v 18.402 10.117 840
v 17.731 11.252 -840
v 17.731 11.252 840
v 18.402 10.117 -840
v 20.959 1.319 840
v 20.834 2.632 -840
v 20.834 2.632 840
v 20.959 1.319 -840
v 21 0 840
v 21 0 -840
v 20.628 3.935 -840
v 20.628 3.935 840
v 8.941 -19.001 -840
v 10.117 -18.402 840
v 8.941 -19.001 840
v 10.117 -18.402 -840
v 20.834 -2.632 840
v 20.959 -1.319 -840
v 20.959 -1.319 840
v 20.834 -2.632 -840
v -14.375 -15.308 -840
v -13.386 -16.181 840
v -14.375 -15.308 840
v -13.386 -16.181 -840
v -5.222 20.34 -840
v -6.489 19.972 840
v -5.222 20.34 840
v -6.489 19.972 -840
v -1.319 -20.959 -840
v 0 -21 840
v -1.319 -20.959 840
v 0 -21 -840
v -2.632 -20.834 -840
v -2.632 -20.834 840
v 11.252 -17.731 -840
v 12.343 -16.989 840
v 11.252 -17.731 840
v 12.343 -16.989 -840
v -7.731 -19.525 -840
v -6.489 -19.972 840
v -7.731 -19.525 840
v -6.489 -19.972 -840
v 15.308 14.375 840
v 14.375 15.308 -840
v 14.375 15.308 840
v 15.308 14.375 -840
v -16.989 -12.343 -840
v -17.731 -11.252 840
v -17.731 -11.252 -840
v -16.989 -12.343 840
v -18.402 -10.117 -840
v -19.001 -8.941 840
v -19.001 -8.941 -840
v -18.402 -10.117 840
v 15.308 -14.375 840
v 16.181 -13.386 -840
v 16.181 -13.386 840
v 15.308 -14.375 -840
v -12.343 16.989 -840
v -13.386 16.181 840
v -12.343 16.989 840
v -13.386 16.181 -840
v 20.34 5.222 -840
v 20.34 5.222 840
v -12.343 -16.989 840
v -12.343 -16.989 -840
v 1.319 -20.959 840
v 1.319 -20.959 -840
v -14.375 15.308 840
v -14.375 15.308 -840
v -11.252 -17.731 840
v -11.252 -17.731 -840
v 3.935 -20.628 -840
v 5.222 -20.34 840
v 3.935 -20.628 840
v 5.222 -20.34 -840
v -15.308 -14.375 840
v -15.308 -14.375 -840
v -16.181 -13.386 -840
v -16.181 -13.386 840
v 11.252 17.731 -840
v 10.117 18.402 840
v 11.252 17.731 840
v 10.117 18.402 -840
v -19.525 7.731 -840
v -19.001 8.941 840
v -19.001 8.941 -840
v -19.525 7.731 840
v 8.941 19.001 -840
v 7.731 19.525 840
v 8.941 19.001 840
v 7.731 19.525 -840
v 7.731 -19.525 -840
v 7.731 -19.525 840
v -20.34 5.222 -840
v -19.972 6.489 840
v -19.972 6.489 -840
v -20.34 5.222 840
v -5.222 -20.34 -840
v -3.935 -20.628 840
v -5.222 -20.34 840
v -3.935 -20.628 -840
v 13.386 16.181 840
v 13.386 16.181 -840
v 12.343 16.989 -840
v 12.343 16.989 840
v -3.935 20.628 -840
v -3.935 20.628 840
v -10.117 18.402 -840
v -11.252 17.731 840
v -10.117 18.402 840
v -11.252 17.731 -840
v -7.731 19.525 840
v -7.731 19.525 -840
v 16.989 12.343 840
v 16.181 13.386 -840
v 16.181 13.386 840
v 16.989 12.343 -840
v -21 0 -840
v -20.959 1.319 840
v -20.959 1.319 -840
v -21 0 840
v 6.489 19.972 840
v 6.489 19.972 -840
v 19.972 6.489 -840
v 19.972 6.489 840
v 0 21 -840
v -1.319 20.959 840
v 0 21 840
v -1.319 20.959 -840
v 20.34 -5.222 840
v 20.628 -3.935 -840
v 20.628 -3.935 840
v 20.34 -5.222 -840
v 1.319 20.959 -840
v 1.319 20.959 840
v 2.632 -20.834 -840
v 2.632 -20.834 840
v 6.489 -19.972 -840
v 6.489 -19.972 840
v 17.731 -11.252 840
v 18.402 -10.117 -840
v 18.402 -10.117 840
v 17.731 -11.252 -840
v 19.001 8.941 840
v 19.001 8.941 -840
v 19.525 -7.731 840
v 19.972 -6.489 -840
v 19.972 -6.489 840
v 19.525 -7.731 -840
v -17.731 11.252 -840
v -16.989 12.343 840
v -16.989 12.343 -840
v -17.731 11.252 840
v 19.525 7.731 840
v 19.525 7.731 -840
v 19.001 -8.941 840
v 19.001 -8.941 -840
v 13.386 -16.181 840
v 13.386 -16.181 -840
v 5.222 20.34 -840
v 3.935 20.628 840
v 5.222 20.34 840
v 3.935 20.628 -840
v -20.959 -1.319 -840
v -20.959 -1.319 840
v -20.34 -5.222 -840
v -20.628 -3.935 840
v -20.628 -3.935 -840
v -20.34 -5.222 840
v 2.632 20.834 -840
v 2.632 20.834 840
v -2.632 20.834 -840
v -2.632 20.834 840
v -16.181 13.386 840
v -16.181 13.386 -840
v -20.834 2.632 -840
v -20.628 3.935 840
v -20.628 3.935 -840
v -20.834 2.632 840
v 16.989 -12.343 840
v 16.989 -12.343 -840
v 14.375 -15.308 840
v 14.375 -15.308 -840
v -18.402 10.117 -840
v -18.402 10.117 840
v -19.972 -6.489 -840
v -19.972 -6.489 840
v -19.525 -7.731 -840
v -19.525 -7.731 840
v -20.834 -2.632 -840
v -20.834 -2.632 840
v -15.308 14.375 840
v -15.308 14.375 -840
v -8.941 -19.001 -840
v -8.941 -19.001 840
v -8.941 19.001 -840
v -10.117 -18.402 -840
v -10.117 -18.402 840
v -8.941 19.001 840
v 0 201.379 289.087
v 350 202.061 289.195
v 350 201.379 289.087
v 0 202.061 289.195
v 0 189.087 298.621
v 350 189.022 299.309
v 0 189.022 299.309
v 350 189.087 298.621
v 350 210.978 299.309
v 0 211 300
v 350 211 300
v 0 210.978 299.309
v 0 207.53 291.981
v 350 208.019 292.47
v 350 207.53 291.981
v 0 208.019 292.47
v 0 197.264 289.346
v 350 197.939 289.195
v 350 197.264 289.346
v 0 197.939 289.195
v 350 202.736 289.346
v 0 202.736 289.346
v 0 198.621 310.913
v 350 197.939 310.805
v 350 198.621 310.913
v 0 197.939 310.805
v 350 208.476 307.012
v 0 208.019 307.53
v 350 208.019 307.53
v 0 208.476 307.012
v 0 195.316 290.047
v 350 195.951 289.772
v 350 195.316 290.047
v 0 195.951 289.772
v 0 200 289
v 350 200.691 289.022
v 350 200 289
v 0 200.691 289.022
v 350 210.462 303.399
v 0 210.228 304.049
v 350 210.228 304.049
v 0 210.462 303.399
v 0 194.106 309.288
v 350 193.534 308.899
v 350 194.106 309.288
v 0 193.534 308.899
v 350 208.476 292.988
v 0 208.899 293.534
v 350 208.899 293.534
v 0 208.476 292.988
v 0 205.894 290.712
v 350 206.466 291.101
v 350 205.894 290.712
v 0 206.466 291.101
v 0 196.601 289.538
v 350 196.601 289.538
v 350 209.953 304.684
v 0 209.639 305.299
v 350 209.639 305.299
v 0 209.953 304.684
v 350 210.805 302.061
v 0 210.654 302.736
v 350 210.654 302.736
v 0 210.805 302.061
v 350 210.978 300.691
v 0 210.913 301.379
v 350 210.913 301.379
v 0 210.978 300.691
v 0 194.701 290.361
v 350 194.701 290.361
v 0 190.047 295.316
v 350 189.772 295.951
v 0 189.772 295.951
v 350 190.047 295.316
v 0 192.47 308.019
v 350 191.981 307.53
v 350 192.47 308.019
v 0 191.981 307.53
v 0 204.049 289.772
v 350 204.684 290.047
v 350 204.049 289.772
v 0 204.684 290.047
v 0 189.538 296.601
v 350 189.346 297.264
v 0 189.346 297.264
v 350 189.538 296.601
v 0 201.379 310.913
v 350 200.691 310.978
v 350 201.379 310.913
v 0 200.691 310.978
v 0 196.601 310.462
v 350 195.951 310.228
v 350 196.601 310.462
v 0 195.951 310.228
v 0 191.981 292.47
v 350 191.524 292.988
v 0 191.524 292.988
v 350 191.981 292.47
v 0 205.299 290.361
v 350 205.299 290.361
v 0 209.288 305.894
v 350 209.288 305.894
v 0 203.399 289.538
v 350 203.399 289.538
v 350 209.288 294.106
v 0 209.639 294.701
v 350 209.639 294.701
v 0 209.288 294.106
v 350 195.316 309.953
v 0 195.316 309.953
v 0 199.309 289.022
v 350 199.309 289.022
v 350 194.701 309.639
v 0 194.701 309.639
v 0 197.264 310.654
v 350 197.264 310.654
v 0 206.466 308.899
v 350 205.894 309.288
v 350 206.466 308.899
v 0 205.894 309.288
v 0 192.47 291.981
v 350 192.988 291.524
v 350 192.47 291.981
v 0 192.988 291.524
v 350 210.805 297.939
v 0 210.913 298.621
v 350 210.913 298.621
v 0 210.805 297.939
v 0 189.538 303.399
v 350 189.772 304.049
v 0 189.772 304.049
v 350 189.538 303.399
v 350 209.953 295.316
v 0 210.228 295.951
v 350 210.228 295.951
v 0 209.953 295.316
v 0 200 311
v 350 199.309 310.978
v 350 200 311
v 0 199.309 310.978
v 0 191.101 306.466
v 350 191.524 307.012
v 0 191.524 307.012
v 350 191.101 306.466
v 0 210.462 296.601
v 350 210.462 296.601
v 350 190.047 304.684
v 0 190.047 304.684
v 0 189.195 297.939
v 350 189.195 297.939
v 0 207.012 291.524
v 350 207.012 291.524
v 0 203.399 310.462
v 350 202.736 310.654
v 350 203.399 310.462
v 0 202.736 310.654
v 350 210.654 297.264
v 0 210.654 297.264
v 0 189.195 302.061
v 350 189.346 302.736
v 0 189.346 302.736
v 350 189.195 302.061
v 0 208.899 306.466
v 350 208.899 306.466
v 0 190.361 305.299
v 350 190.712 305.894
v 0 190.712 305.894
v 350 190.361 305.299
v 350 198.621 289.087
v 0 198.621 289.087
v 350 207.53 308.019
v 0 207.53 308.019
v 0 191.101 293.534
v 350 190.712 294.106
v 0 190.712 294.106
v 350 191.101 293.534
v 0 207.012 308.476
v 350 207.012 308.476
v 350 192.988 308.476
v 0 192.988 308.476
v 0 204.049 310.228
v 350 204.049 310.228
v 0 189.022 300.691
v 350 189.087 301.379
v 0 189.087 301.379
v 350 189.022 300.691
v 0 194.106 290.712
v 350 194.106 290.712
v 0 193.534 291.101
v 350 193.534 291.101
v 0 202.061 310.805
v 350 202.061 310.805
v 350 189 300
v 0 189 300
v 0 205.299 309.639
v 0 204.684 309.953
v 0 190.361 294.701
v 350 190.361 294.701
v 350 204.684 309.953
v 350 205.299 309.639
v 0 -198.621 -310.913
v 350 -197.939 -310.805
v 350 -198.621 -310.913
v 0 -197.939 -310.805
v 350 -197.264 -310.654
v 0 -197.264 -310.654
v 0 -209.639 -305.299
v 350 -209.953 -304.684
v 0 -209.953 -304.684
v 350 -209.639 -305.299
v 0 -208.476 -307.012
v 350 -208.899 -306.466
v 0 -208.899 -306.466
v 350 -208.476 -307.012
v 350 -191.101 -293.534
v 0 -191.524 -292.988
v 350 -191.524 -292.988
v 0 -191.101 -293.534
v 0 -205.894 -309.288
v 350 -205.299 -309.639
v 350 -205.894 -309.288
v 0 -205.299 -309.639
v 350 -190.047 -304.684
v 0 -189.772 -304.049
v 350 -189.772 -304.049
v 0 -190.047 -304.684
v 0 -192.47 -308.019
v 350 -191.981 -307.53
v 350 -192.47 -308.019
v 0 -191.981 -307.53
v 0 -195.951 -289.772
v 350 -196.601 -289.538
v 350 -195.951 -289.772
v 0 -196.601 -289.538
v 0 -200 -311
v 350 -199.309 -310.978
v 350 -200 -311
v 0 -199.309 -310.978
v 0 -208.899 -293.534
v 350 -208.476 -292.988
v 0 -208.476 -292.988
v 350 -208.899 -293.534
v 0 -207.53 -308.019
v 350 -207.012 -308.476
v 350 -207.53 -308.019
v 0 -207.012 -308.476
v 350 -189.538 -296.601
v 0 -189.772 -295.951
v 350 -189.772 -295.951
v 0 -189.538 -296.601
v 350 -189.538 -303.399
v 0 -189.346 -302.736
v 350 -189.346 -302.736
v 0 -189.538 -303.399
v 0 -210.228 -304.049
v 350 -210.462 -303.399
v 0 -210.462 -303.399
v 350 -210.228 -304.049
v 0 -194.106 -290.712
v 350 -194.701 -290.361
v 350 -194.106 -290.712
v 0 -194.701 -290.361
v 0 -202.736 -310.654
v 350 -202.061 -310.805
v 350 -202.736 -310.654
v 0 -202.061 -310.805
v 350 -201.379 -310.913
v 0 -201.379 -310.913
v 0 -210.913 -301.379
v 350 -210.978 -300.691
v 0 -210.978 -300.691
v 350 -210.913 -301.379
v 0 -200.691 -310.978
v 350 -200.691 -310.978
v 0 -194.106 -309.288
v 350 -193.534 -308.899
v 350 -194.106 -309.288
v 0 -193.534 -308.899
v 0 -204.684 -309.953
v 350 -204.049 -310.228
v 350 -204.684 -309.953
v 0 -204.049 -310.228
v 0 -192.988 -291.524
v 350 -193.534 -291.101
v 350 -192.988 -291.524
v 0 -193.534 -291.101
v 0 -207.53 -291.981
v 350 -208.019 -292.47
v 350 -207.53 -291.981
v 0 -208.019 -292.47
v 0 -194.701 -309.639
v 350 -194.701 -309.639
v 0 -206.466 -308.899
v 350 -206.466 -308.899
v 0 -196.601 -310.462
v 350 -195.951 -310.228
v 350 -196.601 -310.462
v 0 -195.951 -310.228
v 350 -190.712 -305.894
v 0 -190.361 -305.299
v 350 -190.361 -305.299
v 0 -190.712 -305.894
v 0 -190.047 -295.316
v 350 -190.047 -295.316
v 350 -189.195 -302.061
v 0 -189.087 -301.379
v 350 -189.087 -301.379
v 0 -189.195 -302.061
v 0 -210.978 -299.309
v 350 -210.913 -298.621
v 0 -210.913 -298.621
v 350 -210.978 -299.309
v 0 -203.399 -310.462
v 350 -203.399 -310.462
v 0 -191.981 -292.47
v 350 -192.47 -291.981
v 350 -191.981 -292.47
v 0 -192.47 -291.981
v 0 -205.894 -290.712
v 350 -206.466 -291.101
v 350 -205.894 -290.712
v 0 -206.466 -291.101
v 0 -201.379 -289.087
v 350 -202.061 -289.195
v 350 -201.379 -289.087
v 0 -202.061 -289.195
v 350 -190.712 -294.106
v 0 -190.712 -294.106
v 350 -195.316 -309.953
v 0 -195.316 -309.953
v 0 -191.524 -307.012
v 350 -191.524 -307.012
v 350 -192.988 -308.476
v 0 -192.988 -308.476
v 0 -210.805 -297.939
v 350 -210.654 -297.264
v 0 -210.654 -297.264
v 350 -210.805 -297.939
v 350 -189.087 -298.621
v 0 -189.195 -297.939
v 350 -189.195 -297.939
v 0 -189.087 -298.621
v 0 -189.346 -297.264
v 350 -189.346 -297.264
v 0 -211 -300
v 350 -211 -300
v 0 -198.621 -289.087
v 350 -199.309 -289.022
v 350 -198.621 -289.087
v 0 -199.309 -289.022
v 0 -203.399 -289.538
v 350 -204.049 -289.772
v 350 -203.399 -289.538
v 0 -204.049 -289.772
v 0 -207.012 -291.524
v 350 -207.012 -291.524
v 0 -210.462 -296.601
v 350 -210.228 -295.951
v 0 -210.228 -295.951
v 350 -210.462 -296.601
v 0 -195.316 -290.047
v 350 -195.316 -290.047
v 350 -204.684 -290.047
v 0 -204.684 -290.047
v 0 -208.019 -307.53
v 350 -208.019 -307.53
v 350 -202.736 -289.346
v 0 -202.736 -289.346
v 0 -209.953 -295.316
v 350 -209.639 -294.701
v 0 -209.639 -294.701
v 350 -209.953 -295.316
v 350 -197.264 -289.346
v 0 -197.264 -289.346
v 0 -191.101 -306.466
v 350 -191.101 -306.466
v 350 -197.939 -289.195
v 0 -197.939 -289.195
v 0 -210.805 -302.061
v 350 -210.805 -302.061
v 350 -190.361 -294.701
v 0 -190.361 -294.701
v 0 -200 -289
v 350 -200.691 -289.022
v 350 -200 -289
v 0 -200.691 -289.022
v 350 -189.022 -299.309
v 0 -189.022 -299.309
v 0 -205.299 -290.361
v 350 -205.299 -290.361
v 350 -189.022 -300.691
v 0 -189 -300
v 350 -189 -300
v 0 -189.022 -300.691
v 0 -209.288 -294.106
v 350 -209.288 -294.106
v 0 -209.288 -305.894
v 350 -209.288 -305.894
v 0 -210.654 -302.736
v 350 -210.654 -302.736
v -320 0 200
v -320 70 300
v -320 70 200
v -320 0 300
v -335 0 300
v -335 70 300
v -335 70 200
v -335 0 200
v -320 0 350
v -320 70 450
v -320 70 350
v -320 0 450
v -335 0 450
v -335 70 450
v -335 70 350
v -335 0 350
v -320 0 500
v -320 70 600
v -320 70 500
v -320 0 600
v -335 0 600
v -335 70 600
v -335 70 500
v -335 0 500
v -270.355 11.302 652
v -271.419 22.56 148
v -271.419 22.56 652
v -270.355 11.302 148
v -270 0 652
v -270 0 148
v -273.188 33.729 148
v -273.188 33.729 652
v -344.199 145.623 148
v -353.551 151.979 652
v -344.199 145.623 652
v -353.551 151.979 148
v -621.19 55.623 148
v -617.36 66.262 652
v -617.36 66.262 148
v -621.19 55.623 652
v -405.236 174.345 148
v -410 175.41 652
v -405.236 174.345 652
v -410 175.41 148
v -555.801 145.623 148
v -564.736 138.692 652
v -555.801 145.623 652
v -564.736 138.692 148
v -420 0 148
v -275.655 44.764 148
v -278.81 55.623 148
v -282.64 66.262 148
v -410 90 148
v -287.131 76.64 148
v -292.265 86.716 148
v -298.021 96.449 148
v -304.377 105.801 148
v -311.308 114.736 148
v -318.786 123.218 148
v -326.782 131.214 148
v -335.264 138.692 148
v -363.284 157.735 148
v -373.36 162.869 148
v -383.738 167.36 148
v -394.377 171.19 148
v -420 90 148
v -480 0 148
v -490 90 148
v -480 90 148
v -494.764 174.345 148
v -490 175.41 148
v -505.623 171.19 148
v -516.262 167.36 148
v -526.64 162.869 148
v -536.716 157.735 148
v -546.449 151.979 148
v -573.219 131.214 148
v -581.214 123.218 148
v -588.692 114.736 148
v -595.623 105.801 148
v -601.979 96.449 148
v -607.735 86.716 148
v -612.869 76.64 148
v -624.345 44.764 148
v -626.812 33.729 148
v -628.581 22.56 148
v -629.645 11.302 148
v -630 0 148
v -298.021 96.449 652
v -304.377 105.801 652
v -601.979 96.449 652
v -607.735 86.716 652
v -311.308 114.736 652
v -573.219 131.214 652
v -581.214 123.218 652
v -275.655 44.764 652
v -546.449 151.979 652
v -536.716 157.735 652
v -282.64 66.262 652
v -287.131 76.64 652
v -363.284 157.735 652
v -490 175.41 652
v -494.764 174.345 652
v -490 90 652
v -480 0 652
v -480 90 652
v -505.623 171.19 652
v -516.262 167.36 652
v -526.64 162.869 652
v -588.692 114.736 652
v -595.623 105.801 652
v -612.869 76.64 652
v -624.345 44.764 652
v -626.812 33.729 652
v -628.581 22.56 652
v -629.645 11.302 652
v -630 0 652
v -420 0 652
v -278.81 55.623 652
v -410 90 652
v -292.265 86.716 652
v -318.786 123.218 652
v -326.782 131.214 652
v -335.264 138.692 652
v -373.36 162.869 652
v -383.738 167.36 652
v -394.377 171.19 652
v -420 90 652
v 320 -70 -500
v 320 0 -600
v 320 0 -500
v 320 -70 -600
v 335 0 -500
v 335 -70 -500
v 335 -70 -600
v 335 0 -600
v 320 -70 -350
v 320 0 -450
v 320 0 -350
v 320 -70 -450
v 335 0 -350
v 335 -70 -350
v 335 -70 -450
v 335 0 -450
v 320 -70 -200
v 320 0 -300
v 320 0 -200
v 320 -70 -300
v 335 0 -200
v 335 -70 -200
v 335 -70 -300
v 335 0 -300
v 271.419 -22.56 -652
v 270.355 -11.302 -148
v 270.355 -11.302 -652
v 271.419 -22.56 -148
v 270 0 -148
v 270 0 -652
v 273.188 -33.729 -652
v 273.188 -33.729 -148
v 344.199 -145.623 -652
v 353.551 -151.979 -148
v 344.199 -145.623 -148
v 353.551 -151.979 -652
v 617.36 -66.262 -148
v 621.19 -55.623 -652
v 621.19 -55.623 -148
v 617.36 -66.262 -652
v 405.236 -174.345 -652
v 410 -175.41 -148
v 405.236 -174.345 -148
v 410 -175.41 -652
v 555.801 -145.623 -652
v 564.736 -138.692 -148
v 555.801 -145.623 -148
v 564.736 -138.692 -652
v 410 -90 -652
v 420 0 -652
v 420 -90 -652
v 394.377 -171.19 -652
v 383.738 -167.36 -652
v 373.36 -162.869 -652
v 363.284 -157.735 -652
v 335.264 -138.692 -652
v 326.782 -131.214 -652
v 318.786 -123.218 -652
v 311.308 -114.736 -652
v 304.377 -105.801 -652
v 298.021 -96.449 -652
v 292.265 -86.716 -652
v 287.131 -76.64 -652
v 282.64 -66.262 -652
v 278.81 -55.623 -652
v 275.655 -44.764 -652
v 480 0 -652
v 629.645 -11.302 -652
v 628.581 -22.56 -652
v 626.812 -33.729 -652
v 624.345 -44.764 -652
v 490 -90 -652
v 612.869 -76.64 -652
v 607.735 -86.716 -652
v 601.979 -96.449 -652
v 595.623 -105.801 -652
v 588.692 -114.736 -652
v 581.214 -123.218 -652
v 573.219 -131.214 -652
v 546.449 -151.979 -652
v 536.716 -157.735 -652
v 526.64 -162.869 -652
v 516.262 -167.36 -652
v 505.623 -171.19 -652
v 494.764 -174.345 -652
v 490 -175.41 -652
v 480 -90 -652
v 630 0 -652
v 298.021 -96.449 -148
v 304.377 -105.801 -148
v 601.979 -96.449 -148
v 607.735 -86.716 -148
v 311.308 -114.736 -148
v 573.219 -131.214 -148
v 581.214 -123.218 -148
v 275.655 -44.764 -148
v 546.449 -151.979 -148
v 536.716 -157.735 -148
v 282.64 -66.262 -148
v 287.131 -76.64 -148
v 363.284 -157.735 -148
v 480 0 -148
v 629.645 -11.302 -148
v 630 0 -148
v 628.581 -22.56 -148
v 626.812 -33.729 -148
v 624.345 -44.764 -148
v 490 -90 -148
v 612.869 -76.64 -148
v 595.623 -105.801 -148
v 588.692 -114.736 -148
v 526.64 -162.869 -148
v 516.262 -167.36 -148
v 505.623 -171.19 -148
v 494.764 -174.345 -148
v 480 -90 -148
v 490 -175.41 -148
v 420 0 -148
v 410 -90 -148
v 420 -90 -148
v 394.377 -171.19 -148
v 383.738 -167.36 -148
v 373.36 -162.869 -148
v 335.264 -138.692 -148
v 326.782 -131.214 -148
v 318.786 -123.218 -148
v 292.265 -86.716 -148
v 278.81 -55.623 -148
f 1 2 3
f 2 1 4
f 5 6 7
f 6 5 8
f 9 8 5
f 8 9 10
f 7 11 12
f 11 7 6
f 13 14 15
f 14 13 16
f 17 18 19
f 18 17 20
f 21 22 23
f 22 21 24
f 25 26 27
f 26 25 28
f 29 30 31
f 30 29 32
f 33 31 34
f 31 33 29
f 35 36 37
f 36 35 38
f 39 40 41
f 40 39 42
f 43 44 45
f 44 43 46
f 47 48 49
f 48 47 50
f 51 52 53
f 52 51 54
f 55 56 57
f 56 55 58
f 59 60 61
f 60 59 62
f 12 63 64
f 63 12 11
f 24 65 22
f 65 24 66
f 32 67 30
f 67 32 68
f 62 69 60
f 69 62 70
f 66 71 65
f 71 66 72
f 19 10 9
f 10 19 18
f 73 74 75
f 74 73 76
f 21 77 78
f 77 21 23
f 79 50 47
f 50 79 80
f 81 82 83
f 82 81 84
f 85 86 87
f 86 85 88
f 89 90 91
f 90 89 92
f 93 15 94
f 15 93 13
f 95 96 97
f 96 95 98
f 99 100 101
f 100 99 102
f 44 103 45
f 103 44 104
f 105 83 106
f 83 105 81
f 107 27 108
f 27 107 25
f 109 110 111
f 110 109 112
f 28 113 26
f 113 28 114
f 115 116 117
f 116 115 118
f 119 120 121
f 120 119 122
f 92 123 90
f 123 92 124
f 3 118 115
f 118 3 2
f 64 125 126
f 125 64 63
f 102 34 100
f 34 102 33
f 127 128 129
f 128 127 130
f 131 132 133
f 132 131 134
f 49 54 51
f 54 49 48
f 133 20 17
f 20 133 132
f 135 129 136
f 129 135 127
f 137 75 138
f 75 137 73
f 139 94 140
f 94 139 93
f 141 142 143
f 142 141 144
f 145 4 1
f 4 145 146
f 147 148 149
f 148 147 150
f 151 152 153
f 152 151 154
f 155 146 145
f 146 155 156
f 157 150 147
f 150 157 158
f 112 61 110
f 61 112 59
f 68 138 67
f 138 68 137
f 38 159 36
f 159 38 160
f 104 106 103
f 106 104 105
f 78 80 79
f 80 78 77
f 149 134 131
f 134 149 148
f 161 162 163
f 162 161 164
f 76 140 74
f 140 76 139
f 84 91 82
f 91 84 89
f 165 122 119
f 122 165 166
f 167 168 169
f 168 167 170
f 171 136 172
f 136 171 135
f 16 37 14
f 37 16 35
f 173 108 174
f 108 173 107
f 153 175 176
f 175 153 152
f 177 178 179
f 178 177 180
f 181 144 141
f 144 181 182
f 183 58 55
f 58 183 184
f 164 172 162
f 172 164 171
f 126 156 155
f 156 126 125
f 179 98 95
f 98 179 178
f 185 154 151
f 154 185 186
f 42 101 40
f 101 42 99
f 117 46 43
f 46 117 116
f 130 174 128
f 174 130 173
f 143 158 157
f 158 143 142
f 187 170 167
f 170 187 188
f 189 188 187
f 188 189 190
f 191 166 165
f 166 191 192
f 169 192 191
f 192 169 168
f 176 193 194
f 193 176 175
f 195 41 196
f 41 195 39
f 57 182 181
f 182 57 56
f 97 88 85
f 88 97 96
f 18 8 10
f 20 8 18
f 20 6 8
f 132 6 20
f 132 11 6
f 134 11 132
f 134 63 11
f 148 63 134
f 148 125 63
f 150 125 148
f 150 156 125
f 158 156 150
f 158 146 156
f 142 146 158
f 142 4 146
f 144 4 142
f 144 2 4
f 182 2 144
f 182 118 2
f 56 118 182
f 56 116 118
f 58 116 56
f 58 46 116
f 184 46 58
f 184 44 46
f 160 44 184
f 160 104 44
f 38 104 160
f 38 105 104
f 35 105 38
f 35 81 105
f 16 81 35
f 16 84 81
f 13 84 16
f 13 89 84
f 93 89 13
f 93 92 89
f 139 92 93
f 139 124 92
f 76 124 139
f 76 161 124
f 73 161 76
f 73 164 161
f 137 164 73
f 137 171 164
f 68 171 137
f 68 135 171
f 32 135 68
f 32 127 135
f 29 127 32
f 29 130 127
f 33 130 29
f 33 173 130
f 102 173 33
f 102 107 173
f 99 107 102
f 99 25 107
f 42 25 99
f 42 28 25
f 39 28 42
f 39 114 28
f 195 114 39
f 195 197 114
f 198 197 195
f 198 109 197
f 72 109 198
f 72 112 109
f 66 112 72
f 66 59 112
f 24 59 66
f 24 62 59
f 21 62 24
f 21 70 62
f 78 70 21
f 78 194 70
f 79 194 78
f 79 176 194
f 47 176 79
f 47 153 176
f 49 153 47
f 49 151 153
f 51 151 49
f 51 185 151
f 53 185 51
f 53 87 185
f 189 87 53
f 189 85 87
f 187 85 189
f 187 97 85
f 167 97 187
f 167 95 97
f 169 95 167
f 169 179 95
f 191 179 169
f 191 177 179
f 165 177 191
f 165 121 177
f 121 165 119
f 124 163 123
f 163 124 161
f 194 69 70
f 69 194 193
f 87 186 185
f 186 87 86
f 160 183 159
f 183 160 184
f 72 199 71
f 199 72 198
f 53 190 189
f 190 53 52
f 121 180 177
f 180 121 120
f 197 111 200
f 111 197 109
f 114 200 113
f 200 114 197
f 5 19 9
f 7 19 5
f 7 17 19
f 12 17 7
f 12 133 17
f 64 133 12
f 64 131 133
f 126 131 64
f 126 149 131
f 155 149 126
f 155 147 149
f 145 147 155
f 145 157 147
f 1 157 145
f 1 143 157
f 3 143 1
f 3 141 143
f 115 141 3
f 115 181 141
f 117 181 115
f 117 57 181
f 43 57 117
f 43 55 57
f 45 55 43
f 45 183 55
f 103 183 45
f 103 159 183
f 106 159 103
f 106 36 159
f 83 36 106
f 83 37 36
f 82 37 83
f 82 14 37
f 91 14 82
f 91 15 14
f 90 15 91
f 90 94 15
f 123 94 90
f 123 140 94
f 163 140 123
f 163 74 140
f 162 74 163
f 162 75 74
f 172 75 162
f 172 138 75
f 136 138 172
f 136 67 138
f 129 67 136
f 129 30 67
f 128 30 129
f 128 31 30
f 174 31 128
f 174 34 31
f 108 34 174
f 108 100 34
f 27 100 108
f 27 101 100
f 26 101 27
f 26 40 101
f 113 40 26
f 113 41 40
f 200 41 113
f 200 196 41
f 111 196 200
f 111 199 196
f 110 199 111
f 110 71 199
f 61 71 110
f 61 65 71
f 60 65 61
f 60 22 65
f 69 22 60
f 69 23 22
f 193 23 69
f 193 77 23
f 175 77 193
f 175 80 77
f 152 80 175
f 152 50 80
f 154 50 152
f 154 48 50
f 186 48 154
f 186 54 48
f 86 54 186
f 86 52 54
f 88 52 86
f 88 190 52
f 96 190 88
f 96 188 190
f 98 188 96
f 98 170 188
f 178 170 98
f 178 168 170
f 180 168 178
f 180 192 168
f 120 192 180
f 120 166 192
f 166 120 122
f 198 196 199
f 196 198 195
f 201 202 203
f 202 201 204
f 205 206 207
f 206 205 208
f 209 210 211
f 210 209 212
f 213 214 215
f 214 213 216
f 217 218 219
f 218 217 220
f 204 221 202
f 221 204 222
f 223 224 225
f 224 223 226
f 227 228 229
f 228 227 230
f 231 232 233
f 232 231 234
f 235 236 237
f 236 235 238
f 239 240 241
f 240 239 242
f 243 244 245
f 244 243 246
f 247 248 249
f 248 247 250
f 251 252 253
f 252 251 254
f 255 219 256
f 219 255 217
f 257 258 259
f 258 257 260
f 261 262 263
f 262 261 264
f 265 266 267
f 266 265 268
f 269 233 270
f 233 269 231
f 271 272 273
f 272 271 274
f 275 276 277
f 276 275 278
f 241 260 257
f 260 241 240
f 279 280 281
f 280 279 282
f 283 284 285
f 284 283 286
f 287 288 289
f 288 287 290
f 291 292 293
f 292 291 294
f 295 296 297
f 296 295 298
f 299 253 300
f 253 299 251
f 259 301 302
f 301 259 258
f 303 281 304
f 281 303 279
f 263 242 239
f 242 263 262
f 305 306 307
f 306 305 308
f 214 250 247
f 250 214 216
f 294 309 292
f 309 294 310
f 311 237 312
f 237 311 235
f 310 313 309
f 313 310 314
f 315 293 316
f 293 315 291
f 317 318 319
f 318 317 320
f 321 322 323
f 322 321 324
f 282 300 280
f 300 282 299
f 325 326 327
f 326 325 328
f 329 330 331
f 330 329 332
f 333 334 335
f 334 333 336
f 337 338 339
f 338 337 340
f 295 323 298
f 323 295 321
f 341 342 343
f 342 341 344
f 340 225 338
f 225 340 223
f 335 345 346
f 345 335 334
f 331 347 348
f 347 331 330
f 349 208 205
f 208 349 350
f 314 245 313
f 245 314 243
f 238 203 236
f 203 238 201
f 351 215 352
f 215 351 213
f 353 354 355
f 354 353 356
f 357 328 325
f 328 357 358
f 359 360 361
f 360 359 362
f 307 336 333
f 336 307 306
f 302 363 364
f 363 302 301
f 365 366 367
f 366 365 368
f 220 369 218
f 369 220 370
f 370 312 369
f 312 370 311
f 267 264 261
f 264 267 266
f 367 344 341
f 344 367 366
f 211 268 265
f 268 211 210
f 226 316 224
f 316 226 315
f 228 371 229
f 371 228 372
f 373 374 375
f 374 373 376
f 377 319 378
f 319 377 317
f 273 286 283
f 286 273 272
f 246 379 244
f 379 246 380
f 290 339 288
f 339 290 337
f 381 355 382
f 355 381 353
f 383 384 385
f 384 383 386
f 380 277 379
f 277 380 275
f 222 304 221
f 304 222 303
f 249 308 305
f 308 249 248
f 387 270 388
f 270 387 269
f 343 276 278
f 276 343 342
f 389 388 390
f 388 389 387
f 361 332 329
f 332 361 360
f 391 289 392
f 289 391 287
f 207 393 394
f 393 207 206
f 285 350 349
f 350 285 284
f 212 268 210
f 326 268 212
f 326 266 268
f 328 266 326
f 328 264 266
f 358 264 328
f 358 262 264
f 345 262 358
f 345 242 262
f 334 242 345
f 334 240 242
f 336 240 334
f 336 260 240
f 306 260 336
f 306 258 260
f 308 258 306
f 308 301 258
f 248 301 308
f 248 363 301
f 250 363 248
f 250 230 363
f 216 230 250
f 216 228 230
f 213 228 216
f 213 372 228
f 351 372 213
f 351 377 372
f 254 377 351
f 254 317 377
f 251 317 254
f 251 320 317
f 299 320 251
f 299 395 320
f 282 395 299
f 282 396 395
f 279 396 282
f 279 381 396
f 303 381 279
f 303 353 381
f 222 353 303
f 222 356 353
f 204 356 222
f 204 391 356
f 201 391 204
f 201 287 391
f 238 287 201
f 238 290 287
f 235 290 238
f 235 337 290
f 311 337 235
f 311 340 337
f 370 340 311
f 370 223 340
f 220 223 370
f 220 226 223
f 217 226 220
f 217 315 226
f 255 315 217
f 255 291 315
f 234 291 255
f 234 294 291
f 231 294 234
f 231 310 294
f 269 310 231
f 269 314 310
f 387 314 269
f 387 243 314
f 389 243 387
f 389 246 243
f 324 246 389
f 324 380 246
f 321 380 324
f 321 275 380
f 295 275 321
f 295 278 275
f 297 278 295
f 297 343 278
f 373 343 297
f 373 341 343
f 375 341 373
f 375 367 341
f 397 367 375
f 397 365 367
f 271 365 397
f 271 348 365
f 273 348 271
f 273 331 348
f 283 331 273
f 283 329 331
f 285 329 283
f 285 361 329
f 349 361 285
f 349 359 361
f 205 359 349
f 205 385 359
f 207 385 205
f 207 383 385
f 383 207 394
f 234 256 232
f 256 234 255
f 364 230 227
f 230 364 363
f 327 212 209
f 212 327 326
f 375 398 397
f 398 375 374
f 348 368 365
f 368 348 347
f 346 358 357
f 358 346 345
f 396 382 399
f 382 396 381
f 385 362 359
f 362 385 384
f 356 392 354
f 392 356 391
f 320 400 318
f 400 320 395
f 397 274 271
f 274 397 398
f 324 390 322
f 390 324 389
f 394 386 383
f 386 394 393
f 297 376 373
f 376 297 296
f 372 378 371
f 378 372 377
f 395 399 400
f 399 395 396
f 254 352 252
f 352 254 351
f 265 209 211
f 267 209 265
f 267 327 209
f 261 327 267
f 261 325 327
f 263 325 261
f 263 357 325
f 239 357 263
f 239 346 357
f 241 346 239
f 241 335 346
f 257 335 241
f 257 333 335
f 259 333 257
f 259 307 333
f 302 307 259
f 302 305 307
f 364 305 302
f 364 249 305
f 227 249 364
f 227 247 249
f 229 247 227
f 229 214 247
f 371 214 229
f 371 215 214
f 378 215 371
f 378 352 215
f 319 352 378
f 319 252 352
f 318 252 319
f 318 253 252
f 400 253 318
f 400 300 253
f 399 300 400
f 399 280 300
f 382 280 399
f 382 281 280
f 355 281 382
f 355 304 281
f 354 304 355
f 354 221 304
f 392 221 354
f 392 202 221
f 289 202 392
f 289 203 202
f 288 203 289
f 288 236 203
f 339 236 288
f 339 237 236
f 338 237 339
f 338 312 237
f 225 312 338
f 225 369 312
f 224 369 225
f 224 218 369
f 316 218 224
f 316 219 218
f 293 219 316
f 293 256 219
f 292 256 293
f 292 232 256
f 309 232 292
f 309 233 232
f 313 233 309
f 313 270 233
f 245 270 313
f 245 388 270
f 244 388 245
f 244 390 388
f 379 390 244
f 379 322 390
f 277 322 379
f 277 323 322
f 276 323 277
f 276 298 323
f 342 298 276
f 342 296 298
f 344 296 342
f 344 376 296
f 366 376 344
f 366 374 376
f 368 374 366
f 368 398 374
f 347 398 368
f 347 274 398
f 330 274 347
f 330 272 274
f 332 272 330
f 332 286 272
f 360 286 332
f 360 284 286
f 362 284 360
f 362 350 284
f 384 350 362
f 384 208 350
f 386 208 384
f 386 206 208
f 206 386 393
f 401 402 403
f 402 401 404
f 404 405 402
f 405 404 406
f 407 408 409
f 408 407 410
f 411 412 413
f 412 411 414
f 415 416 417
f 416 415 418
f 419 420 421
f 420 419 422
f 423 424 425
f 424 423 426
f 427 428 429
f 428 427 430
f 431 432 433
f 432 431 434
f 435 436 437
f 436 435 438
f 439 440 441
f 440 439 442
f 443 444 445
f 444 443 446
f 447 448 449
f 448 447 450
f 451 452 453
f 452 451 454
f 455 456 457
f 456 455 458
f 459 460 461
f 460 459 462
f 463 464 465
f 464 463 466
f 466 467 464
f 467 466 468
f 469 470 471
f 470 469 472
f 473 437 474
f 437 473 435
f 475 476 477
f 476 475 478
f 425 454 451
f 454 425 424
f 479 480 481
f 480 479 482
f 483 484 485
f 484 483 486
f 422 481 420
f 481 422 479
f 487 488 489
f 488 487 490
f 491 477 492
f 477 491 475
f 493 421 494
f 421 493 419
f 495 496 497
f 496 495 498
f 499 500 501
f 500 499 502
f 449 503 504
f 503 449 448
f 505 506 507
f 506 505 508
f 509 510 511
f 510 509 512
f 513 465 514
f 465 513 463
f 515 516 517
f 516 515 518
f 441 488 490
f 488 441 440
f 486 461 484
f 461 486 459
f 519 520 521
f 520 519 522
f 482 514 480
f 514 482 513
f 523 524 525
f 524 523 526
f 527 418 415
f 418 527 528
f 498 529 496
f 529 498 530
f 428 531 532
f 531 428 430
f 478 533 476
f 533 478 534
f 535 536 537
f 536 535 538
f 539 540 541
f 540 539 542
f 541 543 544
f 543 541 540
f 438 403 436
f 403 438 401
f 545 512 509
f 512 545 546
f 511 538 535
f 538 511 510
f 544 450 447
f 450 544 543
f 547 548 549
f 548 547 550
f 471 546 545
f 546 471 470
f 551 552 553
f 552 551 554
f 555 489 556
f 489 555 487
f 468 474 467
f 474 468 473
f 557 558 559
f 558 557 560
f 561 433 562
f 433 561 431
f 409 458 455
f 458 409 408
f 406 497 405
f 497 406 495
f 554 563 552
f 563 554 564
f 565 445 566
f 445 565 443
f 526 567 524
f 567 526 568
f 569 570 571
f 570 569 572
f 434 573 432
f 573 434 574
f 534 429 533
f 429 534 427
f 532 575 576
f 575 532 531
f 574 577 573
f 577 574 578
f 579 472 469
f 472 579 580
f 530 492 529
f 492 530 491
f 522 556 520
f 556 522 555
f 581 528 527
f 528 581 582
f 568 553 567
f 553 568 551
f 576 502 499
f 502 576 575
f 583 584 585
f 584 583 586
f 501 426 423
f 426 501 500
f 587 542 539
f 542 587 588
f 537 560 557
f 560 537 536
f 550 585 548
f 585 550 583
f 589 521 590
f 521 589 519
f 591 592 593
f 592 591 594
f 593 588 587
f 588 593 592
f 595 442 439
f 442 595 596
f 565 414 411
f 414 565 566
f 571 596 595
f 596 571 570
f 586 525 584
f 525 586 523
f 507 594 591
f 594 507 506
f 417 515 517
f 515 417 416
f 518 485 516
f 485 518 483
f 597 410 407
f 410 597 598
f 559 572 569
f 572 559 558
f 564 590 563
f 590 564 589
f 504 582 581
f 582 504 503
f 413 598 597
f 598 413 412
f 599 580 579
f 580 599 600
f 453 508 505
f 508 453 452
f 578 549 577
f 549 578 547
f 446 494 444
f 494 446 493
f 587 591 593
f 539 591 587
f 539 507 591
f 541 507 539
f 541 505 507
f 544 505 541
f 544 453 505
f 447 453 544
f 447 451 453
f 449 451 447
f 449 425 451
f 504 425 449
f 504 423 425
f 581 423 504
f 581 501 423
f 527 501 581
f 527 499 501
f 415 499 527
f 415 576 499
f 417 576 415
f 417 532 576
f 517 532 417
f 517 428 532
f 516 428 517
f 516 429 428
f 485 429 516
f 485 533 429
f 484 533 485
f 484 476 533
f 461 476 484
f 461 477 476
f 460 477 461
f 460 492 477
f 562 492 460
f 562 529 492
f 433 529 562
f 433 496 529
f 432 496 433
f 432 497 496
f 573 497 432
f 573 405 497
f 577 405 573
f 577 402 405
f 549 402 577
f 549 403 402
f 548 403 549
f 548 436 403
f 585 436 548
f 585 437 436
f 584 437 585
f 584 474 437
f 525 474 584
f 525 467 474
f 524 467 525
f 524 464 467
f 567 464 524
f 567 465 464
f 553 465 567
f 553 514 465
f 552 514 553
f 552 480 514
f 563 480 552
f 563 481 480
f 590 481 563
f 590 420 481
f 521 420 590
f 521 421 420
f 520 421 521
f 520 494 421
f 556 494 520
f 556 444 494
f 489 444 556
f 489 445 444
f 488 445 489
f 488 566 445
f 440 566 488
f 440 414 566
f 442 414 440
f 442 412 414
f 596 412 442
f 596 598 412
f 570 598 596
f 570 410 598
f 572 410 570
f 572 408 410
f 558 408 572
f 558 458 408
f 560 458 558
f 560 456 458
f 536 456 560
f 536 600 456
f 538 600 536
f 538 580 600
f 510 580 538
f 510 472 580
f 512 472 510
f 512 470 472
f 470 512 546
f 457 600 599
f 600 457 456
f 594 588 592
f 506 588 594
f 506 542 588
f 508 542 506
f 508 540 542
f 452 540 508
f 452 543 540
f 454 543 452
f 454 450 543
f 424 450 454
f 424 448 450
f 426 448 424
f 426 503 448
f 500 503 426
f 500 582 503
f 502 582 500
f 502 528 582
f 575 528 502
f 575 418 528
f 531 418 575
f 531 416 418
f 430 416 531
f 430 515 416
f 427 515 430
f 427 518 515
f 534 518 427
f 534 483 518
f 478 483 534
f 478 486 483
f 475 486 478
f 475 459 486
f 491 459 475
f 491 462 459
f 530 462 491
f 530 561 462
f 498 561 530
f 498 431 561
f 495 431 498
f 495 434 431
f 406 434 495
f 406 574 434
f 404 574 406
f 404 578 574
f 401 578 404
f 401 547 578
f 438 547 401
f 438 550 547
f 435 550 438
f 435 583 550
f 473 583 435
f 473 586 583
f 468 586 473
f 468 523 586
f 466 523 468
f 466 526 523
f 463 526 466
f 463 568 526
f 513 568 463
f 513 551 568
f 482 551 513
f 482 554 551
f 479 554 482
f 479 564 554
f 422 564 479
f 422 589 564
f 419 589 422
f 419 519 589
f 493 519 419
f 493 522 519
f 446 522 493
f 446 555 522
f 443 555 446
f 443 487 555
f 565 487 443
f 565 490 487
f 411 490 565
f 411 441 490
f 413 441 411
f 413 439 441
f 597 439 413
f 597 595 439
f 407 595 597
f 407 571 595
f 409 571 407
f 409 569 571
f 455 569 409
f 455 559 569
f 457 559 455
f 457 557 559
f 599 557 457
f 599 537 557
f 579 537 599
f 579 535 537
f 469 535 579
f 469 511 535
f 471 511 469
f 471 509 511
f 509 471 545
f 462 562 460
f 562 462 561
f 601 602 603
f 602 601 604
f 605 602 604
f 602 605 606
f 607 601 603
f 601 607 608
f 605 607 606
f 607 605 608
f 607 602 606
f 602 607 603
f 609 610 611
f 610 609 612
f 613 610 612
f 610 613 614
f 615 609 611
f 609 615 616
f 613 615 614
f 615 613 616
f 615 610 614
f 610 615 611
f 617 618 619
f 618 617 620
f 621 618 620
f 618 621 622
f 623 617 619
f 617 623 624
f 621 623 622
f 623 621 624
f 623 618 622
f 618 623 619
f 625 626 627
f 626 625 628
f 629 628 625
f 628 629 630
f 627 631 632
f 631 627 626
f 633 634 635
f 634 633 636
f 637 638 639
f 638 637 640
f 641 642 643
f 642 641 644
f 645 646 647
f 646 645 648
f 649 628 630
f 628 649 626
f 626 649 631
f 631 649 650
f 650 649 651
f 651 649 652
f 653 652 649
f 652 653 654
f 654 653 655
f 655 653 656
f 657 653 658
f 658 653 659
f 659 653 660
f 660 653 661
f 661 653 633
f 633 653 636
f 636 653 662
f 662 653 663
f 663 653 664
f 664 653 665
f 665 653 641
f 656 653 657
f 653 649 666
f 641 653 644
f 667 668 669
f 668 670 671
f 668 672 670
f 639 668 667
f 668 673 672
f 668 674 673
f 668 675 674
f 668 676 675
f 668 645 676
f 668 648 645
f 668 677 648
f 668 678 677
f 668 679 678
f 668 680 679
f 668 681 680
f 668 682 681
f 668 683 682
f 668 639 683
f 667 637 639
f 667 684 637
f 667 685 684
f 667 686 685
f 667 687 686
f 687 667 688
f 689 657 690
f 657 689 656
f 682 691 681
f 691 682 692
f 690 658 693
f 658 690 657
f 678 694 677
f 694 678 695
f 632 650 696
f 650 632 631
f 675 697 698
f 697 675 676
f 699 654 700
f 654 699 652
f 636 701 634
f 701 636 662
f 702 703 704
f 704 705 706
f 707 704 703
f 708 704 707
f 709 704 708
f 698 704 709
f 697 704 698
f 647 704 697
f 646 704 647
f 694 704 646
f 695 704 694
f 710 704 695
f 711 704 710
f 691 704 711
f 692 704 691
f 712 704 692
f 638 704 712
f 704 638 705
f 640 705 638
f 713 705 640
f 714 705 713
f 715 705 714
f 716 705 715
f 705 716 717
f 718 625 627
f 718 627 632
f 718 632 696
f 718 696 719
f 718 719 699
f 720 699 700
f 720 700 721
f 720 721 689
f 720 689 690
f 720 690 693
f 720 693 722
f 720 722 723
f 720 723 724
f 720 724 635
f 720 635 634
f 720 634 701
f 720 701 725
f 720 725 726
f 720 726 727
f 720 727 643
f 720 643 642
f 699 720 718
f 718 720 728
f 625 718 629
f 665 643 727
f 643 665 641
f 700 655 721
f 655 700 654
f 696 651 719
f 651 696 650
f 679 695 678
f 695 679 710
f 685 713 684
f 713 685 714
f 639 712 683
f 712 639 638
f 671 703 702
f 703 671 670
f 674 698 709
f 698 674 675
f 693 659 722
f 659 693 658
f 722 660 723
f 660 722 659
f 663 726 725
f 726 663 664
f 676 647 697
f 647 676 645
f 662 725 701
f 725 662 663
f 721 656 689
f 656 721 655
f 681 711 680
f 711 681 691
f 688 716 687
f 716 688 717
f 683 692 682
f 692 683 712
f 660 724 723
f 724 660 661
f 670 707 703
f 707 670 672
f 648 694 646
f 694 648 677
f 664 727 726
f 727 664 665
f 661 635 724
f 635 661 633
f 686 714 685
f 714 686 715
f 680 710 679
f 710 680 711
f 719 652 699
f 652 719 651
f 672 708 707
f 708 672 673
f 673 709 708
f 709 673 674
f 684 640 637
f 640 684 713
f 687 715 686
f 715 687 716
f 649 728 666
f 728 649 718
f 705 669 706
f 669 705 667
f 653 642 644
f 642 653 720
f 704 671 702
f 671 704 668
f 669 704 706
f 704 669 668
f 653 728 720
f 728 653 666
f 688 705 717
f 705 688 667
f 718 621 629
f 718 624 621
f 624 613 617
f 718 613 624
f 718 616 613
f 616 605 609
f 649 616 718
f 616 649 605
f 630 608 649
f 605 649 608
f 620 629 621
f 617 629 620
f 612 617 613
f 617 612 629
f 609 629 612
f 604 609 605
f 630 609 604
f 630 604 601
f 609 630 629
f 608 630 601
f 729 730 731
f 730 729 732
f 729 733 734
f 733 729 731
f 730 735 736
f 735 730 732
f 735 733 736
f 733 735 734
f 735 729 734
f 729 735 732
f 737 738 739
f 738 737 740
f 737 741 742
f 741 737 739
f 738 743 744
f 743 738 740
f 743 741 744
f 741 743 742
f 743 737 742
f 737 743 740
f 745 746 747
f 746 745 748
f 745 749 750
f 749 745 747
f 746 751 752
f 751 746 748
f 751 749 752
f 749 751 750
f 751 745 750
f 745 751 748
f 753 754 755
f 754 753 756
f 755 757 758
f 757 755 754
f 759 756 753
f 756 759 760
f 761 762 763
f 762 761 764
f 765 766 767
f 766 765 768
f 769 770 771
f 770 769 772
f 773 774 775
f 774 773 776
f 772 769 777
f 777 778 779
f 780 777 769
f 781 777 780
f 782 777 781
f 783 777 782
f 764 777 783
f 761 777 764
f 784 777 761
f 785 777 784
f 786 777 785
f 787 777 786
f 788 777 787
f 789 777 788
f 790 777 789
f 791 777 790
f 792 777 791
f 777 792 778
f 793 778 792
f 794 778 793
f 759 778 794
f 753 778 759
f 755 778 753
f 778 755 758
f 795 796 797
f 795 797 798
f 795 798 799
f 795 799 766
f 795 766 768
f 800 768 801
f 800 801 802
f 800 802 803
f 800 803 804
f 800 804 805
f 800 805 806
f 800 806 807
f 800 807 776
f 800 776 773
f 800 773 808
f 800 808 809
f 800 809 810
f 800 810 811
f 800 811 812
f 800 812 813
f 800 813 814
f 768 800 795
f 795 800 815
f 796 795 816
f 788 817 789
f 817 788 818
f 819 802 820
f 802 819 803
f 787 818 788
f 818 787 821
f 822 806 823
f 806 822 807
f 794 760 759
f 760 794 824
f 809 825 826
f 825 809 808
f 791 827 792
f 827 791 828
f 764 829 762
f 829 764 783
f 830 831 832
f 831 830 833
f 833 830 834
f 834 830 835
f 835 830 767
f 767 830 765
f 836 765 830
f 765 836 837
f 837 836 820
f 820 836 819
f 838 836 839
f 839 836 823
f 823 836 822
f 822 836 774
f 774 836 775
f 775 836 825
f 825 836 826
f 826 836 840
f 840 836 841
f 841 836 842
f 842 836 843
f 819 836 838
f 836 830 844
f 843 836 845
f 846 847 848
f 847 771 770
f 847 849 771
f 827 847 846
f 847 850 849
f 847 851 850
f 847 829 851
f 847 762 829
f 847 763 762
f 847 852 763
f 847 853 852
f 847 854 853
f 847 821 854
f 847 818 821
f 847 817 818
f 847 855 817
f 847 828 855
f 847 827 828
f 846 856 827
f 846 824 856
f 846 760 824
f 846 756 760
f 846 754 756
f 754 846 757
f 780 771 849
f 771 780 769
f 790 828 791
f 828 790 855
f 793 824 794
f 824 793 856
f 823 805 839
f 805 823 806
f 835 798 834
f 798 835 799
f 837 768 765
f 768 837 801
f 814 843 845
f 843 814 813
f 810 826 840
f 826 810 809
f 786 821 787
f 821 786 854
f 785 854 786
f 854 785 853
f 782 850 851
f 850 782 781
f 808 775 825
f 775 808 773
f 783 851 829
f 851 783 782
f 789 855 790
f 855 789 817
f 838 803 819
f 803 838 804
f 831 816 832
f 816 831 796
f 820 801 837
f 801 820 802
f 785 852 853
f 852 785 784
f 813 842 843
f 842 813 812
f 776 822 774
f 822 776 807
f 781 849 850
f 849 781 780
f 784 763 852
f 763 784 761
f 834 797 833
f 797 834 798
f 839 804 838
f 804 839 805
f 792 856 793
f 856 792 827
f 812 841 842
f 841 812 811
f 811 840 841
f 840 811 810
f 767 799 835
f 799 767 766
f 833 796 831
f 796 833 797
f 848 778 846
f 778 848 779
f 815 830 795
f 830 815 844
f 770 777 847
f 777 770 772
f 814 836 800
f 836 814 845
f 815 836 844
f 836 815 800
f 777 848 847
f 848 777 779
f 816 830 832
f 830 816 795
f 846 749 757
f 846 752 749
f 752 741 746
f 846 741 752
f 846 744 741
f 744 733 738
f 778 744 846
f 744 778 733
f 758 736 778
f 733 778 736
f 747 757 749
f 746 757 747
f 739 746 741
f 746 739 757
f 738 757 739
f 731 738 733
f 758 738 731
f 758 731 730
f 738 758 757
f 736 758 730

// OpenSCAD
// ============================================================================
// PROJECT: XXXG-00W0 WING GUNDAM ZERO EW - LIMB SKELETON PROTECTION
// COMPONENT VAULT: BANDAI CAST RUNNER B - BICEP CORES B1 & B2
// PACKAGING RE-ARCHITECTURE: SUB-ARMOR CAPACITOR RECESSED BANK INTEGRATION
// CONFIG METRIC: SCALED TITANIUM CASTS WITH LINEAR SLIDEWAYS (1:1 ACTUAL METRIC)
// ============================================================================

$fn = 100; // High-precision circular resolution segment count

// Structural Constants Scaled 1:1 for a 16.7-Meter Airframe Scale (mm)
bicep_total_length = 1120;               // Total vertical height of bicep frame (mm)
bicep_outer_diameter = 360;              // Bounding thickness of bicep core bone (mm)
track_groove_depth = 30;                 // Shoulder multi-link slider slot depth (mm)
track_groove_width = 60;                 // Shoulder multi-link slider slot width (mm)
armor_skin_thickness = 65;              // Solid TiAl protective plating wall (mm)
harness_conduit_width = 80;             // Cast-in 4oz copper logic trace track (mm)
capacitor_pocket_depth = 15;            // Sub-armor recessed housing pocket depth (mm)
capacitor_pocket_width = 140;           // Transverse MLCC array pocket width (mm)

module Runner_B_Bicep_Core_Forge() {
    // Central Supply Injection Runner Axis (Molten Feed Line from Siphon Forge)
    color([0.25, 0.25, 0.28]) {
        cylinder(h = bicep_total_length * 1.5, d = 42, center = true);
        // Direct injection gates tracking straight into the part mold cavities
        translate([0, 200, 300]) rotate([0, 90, 0]) cylinder(h = 350, d = 22);
        translate([0, -200, -300]) rotate([0, 90, 0]) cylinder(h = 350, d = 22);
    }
    
    // Instantiate Scaled Skeutomorphic Part Molds Symmetrically (Left & Right)
    Cast_Internal_Bicep_Cores();
}

module Cast_Internal_Bicep_Cores() {
    // ---- PART B1: INTERNAL LEFT UPPER BICEPS FRAME CORE ----
    translate([-450, 0, 400]) color([0.35, 0.35, 0.38]) { // Inner Frame Dark Spec
        difference() {
            // Main solid heavy-duty bicep bone block segment
            cylinder(h = bicep_total_length * 0.45, d = bicep_outer_diameter, center = true);
            
            // LINEAR TRACKING COWL SLIDEWAY [Milled out for shoulder multi-link sliders]
            cube([track_groove_width, bicep_outer_diameter + 10, bicep_total_length * 0.5], center = true);
            
            // SUB-ARMOR RECESSED CAPACITOR POCKETS [Segmented rows cut inside the armor inner wall]
            for (z_offset = [-150, 0, 150]) {
                translate([(bicep_outer_diameter/2 - armor_skin_thickness + capacitor_pocket_depth/2), 0, z_offset])
                    cube([capacitor_pocket_depth, capacitor_pocket_width, 100], center = true);
            }
            
            // Continuous cast-in routing track for the 4oz solid-state wiring rails
            translate([0, bicep_outer_diameter/2 - 40, 0])
                cube([harness_conduit_width, 100, bicep_total_length], center = true);
            
            // Slicing profile tool to generate an asymmetrical half-shell part component
            translate([0, -bicep_outer_diameter, 0])
                cube([bicep_outer_diameter * 2, bicep_outer_diameter * 2, bicep_total_length * 2], center = true);
        }
    }
    
    // ---- PART B2: INTERNAL RIGHT UPPER BICEPS FRAME CORE ----
    translate([450, 0, -400]) rotate([0, 0, 180]) color([0.35, 0.35, 0.38]) {
        difference() {
            cylinder(h = bicep_total_length * 0.45, d = bicep_outer_diameter, center = true);
            
            cube([track_groove_width, bicep_outer_diameter + 10, bicep_total_length * 0.5], center = true);
            
            for (z_offset = [-150, 0, 150]) {
                translate([(bicep_outer_diameter/2 - armor_skin_thickness + capacitor_pocket_depth/2), 0, z_offset])
                    cube([capacitor_pocket_depth, capacitor_pocket_width, 100], center = true);
            }
            
            translate([0, bicep_outer_diameter/2 - 40, 0])
                cube([harness_conduit_width, 100, bicep_total_length], center = true);
            
            translate([0, -bicep_outer_diameter, 0])
                cube([bicep_outer_diameter * 2, bicep_outer_diameter * 2, bicep_total_length * 2], center = true);
        }
    }
}

// Render Master Assembly to Parameter Workspace
Runner_B_Bicep_Core_Forge();
